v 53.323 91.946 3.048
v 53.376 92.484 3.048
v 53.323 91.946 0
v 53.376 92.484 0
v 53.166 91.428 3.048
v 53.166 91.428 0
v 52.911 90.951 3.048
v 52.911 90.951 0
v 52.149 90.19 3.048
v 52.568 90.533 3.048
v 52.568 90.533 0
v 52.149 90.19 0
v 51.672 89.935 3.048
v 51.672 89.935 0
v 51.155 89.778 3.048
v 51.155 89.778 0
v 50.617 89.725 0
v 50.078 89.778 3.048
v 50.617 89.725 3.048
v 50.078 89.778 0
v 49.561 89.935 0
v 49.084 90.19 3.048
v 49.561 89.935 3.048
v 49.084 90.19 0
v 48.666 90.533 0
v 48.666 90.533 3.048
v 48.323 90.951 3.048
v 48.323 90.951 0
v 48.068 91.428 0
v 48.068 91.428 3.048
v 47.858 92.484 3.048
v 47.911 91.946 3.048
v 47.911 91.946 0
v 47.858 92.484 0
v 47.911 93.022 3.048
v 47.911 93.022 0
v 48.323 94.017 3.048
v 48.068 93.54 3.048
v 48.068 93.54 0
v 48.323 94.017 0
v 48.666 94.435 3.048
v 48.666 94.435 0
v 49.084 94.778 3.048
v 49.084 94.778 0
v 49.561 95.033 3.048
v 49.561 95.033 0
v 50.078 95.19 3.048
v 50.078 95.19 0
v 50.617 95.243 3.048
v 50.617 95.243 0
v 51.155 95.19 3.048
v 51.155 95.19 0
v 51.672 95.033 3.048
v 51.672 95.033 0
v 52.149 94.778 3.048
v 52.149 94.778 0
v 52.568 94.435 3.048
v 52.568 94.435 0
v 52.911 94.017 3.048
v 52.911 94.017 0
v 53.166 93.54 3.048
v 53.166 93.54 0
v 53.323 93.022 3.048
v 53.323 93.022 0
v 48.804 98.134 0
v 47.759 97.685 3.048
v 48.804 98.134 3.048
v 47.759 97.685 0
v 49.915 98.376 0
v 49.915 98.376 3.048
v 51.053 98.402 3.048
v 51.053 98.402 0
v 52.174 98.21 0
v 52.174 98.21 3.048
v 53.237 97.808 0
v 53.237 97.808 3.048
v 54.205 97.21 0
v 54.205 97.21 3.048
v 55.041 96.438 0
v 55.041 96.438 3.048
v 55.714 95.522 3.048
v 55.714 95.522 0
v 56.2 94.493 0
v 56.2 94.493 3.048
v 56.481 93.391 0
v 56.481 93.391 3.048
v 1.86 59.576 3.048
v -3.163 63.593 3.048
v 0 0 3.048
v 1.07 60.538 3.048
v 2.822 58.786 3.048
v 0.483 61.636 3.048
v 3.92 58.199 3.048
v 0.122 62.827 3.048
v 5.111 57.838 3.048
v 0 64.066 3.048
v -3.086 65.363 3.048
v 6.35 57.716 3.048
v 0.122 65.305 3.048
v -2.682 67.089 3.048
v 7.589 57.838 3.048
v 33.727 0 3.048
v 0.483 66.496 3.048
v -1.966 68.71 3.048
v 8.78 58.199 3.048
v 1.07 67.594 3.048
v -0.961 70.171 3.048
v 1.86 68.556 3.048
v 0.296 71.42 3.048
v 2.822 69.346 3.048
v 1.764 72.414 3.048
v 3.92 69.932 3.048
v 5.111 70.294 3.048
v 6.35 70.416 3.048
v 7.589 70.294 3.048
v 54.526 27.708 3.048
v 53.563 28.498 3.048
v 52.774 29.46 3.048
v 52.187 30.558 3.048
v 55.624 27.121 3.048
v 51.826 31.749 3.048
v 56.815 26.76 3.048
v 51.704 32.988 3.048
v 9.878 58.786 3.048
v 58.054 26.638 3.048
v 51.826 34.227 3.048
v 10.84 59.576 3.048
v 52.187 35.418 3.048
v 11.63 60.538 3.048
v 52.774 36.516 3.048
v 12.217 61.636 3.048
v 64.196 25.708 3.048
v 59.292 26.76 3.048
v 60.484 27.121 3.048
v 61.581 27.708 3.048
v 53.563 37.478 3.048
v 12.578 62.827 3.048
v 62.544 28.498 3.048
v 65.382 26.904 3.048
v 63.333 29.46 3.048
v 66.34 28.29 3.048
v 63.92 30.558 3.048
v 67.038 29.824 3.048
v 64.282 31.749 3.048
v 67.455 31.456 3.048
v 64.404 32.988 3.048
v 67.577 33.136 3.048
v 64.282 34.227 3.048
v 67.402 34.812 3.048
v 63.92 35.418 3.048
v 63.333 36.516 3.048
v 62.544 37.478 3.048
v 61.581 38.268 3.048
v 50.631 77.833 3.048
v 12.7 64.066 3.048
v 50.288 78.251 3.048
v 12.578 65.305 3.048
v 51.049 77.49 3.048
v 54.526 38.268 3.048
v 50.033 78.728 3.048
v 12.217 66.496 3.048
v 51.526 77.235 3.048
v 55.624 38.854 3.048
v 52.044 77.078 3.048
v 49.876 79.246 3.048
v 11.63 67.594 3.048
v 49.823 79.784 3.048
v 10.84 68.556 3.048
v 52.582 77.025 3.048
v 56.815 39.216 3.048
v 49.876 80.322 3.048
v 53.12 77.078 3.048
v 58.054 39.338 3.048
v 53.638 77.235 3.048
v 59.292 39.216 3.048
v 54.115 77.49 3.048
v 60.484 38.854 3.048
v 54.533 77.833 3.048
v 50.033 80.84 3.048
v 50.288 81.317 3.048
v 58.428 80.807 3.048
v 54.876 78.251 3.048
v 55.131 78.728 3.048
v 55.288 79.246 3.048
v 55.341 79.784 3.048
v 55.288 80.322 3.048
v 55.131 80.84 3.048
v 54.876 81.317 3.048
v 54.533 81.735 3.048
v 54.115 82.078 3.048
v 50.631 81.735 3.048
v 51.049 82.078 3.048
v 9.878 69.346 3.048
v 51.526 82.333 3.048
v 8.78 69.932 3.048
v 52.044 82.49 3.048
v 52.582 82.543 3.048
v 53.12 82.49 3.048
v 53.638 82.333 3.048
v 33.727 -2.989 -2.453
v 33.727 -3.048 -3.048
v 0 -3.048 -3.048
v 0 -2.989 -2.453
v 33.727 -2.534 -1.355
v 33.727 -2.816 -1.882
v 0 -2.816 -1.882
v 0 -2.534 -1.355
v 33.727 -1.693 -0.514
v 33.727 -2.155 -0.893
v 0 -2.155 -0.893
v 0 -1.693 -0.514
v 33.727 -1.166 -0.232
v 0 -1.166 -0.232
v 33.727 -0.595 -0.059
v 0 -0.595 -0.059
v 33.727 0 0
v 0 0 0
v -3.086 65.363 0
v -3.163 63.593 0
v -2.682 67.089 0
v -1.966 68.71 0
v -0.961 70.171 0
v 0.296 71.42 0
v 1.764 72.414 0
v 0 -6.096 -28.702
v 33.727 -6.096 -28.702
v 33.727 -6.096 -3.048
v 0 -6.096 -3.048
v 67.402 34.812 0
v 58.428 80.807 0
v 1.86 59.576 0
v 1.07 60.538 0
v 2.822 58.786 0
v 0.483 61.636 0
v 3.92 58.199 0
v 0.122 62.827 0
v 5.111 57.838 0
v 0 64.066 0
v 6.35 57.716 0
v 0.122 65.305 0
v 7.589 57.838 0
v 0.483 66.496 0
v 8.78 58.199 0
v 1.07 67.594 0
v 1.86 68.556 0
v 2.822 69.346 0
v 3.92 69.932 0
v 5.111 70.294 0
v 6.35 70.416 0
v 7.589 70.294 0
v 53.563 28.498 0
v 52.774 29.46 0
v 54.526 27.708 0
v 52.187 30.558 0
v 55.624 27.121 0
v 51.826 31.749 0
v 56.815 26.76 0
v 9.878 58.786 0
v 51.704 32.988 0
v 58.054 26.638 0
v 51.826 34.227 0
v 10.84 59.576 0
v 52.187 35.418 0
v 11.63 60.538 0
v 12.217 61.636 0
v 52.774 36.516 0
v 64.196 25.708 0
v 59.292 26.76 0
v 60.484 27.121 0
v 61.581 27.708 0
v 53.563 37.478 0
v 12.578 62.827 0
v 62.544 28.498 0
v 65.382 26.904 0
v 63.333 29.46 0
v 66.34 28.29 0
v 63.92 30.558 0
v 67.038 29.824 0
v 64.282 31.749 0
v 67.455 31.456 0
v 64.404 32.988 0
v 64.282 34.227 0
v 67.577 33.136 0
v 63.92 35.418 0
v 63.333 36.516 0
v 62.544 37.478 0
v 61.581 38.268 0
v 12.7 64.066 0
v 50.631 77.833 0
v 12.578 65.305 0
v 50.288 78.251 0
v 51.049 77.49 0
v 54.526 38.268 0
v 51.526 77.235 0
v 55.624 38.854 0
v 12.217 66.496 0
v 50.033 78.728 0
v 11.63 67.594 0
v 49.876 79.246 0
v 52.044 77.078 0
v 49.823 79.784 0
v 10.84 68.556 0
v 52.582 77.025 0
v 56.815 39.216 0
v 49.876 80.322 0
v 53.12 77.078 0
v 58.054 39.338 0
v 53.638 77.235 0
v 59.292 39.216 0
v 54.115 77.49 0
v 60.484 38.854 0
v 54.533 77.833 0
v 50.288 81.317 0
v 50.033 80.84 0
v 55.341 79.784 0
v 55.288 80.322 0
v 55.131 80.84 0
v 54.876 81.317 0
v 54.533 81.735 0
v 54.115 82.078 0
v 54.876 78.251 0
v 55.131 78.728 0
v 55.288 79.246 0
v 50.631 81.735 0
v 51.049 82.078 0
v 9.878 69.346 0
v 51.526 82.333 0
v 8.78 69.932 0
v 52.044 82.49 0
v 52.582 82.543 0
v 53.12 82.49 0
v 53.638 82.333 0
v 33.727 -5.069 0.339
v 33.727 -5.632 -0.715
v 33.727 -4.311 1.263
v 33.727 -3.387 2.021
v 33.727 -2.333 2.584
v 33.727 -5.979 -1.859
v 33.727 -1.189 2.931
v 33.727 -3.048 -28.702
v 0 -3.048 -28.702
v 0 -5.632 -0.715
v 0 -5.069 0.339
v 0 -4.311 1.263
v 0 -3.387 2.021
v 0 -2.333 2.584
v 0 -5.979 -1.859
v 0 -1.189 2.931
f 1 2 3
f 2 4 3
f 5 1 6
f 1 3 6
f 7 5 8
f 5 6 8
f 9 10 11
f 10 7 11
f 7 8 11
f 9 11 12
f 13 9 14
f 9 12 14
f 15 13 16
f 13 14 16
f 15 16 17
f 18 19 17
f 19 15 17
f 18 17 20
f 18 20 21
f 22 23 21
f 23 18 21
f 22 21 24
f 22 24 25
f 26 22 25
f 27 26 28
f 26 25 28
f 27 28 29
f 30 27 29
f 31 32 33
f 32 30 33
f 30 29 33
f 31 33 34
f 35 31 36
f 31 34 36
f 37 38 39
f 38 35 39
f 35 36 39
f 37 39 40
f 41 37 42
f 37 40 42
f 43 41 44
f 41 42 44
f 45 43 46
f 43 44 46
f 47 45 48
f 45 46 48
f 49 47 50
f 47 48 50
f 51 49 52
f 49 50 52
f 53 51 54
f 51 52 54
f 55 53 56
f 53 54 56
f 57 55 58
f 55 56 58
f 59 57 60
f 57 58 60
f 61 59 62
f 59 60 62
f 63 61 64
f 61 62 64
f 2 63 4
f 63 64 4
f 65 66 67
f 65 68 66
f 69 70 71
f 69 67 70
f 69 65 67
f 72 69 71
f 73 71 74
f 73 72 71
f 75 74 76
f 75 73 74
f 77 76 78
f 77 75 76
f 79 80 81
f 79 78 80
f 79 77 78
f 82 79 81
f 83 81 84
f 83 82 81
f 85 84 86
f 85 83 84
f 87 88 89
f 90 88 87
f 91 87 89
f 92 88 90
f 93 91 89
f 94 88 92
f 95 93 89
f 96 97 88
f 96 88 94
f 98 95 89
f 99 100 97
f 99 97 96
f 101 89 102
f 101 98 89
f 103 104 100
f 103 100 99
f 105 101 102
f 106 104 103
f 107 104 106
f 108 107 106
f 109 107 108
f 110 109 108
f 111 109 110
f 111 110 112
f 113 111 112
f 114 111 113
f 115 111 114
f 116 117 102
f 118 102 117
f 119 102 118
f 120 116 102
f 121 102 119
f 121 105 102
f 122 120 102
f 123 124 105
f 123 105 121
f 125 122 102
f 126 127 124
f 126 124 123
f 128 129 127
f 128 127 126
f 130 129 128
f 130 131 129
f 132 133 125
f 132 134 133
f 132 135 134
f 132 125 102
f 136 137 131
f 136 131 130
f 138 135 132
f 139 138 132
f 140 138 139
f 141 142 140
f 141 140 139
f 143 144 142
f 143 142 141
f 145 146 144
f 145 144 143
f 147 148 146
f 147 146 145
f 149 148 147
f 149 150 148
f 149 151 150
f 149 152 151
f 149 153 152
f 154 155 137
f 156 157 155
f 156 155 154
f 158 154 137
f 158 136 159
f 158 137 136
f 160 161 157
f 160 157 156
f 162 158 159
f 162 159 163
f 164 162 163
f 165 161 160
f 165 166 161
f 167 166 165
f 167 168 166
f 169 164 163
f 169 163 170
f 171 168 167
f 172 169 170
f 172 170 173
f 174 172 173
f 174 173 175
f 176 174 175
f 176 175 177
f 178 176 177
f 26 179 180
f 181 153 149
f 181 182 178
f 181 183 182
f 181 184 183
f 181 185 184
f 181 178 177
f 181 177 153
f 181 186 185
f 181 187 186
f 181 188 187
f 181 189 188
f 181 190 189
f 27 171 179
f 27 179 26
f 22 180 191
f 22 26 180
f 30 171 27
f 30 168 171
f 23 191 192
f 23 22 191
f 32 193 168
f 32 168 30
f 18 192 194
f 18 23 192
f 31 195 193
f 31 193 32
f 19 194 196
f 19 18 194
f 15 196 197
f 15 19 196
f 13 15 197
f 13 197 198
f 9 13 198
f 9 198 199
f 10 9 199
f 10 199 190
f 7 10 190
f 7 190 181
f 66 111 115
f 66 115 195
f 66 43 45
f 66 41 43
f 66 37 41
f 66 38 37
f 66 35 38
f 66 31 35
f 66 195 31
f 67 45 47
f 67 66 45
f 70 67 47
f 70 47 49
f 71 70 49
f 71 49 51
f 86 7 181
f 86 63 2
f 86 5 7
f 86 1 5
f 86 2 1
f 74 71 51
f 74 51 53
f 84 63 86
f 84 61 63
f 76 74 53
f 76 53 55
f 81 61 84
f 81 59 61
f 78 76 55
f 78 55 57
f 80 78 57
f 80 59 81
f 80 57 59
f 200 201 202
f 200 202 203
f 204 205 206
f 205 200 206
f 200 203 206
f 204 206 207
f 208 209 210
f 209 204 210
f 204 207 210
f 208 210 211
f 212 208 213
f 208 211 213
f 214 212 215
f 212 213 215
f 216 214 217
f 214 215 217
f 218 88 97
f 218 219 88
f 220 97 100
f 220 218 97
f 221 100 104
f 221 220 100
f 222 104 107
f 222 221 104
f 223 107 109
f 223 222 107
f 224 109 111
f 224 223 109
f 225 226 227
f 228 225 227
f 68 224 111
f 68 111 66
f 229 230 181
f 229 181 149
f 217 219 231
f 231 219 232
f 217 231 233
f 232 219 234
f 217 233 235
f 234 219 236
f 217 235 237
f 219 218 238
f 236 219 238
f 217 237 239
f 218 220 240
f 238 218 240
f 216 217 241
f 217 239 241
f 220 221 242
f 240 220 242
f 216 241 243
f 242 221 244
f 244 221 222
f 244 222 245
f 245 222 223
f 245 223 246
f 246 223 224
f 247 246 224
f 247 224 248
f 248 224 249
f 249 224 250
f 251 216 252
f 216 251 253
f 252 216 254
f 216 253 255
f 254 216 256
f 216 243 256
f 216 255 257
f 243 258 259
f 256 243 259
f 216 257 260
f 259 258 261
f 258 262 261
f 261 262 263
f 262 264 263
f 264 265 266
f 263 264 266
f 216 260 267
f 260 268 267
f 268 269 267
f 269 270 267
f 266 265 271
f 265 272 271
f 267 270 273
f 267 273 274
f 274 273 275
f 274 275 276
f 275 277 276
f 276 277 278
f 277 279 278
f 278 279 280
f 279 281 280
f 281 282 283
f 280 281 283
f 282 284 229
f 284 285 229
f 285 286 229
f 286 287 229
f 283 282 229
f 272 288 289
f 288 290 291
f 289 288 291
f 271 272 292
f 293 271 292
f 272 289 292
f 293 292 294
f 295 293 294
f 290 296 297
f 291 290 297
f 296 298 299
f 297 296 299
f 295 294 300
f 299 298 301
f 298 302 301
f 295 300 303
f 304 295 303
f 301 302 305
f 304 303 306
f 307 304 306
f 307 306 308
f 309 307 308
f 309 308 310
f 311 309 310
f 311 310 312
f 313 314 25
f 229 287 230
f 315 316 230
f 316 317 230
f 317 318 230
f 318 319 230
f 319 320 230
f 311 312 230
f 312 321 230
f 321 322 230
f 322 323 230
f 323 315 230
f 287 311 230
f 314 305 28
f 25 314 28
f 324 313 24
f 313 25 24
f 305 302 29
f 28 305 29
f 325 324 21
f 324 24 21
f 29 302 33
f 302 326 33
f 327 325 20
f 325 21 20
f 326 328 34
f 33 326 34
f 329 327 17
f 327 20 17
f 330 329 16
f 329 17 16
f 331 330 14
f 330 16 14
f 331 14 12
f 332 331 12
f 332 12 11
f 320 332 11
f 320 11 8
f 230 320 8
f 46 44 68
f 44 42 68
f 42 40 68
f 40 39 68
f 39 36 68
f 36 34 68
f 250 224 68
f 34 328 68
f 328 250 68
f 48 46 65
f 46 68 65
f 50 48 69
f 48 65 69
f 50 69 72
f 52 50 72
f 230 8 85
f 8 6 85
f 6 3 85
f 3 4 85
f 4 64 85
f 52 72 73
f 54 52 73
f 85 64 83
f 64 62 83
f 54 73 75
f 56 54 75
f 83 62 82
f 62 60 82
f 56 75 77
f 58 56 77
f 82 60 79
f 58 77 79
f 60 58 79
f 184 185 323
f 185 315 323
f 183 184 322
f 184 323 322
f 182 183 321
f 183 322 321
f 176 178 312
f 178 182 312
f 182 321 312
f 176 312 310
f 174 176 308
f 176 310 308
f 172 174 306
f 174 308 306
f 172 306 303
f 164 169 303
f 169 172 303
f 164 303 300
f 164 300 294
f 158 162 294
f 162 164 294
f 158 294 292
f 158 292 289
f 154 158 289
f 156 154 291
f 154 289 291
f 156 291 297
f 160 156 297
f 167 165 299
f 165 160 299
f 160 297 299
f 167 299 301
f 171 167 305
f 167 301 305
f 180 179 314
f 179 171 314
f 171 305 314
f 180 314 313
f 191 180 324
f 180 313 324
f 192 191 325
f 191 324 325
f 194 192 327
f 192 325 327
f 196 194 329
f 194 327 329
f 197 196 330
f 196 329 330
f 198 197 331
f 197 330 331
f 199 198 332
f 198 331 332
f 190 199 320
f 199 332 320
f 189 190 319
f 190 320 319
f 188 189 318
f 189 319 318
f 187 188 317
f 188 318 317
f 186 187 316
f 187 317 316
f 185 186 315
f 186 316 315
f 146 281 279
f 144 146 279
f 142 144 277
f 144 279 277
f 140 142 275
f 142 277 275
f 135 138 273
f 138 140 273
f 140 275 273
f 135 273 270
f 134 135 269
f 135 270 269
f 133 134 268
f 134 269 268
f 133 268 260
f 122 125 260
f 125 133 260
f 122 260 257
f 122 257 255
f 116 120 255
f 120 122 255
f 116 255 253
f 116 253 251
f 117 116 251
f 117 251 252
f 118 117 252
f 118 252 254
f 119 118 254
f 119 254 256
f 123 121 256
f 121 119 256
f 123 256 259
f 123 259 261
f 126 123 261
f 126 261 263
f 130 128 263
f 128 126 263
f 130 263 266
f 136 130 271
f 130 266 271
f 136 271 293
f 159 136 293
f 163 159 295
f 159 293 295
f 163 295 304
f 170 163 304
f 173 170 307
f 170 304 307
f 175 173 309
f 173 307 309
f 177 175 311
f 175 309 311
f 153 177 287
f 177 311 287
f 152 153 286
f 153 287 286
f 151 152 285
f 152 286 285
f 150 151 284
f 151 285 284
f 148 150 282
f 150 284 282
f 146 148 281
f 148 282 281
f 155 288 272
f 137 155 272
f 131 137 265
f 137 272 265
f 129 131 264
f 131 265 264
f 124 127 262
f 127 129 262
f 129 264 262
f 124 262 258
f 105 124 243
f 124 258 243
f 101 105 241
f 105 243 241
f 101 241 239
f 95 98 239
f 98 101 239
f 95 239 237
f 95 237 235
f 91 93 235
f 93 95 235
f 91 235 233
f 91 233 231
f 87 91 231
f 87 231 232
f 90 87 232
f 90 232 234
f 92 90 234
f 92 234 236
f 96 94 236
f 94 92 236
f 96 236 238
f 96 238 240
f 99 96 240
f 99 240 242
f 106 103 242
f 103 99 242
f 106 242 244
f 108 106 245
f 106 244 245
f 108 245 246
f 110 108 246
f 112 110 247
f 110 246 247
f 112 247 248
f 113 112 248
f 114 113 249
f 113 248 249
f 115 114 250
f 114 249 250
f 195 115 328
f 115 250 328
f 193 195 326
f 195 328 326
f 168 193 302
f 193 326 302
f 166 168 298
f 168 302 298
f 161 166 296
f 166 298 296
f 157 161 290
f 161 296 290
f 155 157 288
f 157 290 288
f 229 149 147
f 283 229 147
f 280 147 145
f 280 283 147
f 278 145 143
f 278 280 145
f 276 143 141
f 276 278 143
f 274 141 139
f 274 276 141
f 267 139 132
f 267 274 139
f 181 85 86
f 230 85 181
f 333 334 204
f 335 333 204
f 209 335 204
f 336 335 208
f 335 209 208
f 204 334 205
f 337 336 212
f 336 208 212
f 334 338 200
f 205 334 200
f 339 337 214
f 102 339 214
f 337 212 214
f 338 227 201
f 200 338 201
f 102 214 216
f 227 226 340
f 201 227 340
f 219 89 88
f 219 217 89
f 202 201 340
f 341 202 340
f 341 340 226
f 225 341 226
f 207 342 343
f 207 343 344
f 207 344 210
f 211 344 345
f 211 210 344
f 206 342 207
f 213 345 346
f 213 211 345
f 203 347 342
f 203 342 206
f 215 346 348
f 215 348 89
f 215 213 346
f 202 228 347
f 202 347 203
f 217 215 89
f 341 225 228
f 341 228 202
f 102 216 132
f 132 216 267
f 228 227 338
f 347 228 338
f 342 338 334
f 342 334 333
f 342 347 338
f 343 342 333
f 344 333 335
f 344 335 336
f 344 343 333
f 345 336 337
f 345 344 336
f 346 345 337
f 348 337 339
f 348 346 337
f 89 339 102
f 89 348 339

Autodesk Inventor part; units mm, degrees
ref_plane "YZ Plane" through (0, 0, 0) normal (1, 0, 0) x (0, 1, 0)
ref_plane "XZ Plane" through (0, 0, 0) normal (0, 1, 0) x (-1, 0, 0)
ref_plane "XY Plane" through (0, 0, 0) normal (0, 0, 1) x (1, 0, 0)
sketch "Sketch1" plane through (0, 0, 0) normal (0, 0, 1) x (1, 0, 0)
  circle A0 centre (6.35, 64.0658) radius 6.35
  circle A1 centre (58.0536, 32.9878) radius 6.35
  line L0 (0, 0) -> (33.7266, 0)
  circle A2 centre (50.6167, 92.4839) radius 2.7589
  circle A3 centre (52.5819, 79.7839) radius 2.7589
  line L1 (0, 0) -> (0, 86.6758) construction
  dimension "d12" = 12.7
  dimension "d13" = 12.7
  dimension "d15" = 51.7036
  dimension "d16" = 31.078
  dimension "d18" = 32.9877
  dimension "d19" = 24.327
  dimension "d20" = 5.5178
  dimension "d21" = 5.5178
  dimension "d22" = 46.7962
  dimension "d23" = 5.4717
  dimension "d24" = 1.9652
  dimension "d25" = 12.7
sketch "Sketch3" plane through (0, 0, 0) normal (0, 0, 1) x (1, 0, 0)
  circle A0 centre (6.35, 64.0658) radius 6.35
  circle A1 centre (50.6167, 92.4839) radius 2.7589
  circle A2 centre (52.5819, 79.7839) radius 2.7589
  circle A3 centre (58.0536, 32.9878) radius 6.35
  circle A4 centre (6.35, 64.0658) radius 9.525
  circle A5 centre (58.0536, 32.9878) radius 9.525
  circle A6 centre (52.5819, 79.7839) radius 5.9339
  circle A7 centre (50.6167, 92.4839) radius 5.9339
  line L0 (0, 0) -> (-3.1632, 63.5926)
  line L1 (33.7266, 0) -> (64.1959, 25.7078)
  line L2 (1.7635, 72.4138) -> (47.7594, 97.6846)
  line L3 (56.4808, 93.3913) -> (58.446, 80.6913)
  line L4 (58.406, 80.9203) -> (67.4023, 34.8118)
  line L5 (6.35, 64.0658) -> (58.0536, 32.9878) construction
  line L6 (58.0536, 32.9878) -> (52.5819, 79.7839) construction
  line L7 (52.5819, 79.7839) -> (50.6167, 92.4839) construction
  line L8 (50.6167, 92.4839) -> (6.35, 64.0658) construction
  line L9 (52.5819, 79.7839) -> (6.35, 64.0658) construction
  line L10 (0, 0) -> (33.7266, 0)
  line L11 (0, 0) -> (33.7266, 0)
  line L12 (33.7266, 0) -> (33.7266, -31.75)
  line L13 (33.7266, -31.75) -> (0, -31.75)
  line L14 (0, -31.75) -> (0, 0)
  point P0 (58.4282, 80.8062)
  dimension "d27" = 3.175
  dimension "d28" = 3.175
  dimension "d29" = 3.175
  dimension "d30" = 3.175
  dimension "d33" = 31.75
extrude "Plate3" add sketch "Sketch3" along normal blind 3.048 contours A4 | A6 | A4 L2 A7 L3 L4 A5 L1 L10 L0 | A7 | A5
sketch "Sketch4" plane through (0, -3.048, -3.048) normal (0, -1, 0) x (1, 0, 0)
  line L0 (33.7266, 0) -> (0, 0)
  line L1 (0, 0) -> (0, -25.654)
  line L2 (0, -25.654) -> (33.7266, -25.654)
  line L3 (33.7266, -25.654) -> (33.7266, 0)
edge flange "Flange1" height 31.75 angle 90 thickness 3.048 bend radius 3.048 thickness toward (0, -1, 0) relief tear relief width 3.048 relief depth 1.524 edges at (16.8633, 0, 0) wall of the first edge with corners at (33.7266, -3.048, -3.048) (0, -3.048, -3.048) (0, -3.048, -28.702) (33.7266, -3.048, -28.702)
bend "Bend3"
corner "Corner1"
equation "\"d21\" = d20"
equation "\"d28\" = d27"
equation "\"d29\" = d27"
equation "\"d30\" = d27"
equation "\"d31\" = Thickness"
equation "\"d34\" = BendReliefWidth"
equation "\"d35\" = BendReliefDepth"
equation "\"d36\" = MinimumRemnant"
equation "\"d37\" = TransitionRadius"
equation "\"d40\" = BendRadius"
equation "\"d41\" = CornerReliefSize"
equation "\"d42\" = GapSize"
equation "\"d43\" = JacobiRadiusSize"
equation "\"BendRadius\" = Thickness"
equation "\"BendReliefWidth\" = Thickness"
equation "\"BendReliefDepth\" = 0.5 * Thickness"
equation "\"CornerReliefSize\" = 4 * Thickness"
equation "\"MinimumRemnant\" = 2 * Thickness"
equation "\"TransitionRadius\" = BendRadius"
equation "\"JacobiRadiusSize\" = BendRadius"
equation "\"GapSize\" = Thickness"
equation "\"Thickness\" = 3.048"
properties part number "GearsMount"
